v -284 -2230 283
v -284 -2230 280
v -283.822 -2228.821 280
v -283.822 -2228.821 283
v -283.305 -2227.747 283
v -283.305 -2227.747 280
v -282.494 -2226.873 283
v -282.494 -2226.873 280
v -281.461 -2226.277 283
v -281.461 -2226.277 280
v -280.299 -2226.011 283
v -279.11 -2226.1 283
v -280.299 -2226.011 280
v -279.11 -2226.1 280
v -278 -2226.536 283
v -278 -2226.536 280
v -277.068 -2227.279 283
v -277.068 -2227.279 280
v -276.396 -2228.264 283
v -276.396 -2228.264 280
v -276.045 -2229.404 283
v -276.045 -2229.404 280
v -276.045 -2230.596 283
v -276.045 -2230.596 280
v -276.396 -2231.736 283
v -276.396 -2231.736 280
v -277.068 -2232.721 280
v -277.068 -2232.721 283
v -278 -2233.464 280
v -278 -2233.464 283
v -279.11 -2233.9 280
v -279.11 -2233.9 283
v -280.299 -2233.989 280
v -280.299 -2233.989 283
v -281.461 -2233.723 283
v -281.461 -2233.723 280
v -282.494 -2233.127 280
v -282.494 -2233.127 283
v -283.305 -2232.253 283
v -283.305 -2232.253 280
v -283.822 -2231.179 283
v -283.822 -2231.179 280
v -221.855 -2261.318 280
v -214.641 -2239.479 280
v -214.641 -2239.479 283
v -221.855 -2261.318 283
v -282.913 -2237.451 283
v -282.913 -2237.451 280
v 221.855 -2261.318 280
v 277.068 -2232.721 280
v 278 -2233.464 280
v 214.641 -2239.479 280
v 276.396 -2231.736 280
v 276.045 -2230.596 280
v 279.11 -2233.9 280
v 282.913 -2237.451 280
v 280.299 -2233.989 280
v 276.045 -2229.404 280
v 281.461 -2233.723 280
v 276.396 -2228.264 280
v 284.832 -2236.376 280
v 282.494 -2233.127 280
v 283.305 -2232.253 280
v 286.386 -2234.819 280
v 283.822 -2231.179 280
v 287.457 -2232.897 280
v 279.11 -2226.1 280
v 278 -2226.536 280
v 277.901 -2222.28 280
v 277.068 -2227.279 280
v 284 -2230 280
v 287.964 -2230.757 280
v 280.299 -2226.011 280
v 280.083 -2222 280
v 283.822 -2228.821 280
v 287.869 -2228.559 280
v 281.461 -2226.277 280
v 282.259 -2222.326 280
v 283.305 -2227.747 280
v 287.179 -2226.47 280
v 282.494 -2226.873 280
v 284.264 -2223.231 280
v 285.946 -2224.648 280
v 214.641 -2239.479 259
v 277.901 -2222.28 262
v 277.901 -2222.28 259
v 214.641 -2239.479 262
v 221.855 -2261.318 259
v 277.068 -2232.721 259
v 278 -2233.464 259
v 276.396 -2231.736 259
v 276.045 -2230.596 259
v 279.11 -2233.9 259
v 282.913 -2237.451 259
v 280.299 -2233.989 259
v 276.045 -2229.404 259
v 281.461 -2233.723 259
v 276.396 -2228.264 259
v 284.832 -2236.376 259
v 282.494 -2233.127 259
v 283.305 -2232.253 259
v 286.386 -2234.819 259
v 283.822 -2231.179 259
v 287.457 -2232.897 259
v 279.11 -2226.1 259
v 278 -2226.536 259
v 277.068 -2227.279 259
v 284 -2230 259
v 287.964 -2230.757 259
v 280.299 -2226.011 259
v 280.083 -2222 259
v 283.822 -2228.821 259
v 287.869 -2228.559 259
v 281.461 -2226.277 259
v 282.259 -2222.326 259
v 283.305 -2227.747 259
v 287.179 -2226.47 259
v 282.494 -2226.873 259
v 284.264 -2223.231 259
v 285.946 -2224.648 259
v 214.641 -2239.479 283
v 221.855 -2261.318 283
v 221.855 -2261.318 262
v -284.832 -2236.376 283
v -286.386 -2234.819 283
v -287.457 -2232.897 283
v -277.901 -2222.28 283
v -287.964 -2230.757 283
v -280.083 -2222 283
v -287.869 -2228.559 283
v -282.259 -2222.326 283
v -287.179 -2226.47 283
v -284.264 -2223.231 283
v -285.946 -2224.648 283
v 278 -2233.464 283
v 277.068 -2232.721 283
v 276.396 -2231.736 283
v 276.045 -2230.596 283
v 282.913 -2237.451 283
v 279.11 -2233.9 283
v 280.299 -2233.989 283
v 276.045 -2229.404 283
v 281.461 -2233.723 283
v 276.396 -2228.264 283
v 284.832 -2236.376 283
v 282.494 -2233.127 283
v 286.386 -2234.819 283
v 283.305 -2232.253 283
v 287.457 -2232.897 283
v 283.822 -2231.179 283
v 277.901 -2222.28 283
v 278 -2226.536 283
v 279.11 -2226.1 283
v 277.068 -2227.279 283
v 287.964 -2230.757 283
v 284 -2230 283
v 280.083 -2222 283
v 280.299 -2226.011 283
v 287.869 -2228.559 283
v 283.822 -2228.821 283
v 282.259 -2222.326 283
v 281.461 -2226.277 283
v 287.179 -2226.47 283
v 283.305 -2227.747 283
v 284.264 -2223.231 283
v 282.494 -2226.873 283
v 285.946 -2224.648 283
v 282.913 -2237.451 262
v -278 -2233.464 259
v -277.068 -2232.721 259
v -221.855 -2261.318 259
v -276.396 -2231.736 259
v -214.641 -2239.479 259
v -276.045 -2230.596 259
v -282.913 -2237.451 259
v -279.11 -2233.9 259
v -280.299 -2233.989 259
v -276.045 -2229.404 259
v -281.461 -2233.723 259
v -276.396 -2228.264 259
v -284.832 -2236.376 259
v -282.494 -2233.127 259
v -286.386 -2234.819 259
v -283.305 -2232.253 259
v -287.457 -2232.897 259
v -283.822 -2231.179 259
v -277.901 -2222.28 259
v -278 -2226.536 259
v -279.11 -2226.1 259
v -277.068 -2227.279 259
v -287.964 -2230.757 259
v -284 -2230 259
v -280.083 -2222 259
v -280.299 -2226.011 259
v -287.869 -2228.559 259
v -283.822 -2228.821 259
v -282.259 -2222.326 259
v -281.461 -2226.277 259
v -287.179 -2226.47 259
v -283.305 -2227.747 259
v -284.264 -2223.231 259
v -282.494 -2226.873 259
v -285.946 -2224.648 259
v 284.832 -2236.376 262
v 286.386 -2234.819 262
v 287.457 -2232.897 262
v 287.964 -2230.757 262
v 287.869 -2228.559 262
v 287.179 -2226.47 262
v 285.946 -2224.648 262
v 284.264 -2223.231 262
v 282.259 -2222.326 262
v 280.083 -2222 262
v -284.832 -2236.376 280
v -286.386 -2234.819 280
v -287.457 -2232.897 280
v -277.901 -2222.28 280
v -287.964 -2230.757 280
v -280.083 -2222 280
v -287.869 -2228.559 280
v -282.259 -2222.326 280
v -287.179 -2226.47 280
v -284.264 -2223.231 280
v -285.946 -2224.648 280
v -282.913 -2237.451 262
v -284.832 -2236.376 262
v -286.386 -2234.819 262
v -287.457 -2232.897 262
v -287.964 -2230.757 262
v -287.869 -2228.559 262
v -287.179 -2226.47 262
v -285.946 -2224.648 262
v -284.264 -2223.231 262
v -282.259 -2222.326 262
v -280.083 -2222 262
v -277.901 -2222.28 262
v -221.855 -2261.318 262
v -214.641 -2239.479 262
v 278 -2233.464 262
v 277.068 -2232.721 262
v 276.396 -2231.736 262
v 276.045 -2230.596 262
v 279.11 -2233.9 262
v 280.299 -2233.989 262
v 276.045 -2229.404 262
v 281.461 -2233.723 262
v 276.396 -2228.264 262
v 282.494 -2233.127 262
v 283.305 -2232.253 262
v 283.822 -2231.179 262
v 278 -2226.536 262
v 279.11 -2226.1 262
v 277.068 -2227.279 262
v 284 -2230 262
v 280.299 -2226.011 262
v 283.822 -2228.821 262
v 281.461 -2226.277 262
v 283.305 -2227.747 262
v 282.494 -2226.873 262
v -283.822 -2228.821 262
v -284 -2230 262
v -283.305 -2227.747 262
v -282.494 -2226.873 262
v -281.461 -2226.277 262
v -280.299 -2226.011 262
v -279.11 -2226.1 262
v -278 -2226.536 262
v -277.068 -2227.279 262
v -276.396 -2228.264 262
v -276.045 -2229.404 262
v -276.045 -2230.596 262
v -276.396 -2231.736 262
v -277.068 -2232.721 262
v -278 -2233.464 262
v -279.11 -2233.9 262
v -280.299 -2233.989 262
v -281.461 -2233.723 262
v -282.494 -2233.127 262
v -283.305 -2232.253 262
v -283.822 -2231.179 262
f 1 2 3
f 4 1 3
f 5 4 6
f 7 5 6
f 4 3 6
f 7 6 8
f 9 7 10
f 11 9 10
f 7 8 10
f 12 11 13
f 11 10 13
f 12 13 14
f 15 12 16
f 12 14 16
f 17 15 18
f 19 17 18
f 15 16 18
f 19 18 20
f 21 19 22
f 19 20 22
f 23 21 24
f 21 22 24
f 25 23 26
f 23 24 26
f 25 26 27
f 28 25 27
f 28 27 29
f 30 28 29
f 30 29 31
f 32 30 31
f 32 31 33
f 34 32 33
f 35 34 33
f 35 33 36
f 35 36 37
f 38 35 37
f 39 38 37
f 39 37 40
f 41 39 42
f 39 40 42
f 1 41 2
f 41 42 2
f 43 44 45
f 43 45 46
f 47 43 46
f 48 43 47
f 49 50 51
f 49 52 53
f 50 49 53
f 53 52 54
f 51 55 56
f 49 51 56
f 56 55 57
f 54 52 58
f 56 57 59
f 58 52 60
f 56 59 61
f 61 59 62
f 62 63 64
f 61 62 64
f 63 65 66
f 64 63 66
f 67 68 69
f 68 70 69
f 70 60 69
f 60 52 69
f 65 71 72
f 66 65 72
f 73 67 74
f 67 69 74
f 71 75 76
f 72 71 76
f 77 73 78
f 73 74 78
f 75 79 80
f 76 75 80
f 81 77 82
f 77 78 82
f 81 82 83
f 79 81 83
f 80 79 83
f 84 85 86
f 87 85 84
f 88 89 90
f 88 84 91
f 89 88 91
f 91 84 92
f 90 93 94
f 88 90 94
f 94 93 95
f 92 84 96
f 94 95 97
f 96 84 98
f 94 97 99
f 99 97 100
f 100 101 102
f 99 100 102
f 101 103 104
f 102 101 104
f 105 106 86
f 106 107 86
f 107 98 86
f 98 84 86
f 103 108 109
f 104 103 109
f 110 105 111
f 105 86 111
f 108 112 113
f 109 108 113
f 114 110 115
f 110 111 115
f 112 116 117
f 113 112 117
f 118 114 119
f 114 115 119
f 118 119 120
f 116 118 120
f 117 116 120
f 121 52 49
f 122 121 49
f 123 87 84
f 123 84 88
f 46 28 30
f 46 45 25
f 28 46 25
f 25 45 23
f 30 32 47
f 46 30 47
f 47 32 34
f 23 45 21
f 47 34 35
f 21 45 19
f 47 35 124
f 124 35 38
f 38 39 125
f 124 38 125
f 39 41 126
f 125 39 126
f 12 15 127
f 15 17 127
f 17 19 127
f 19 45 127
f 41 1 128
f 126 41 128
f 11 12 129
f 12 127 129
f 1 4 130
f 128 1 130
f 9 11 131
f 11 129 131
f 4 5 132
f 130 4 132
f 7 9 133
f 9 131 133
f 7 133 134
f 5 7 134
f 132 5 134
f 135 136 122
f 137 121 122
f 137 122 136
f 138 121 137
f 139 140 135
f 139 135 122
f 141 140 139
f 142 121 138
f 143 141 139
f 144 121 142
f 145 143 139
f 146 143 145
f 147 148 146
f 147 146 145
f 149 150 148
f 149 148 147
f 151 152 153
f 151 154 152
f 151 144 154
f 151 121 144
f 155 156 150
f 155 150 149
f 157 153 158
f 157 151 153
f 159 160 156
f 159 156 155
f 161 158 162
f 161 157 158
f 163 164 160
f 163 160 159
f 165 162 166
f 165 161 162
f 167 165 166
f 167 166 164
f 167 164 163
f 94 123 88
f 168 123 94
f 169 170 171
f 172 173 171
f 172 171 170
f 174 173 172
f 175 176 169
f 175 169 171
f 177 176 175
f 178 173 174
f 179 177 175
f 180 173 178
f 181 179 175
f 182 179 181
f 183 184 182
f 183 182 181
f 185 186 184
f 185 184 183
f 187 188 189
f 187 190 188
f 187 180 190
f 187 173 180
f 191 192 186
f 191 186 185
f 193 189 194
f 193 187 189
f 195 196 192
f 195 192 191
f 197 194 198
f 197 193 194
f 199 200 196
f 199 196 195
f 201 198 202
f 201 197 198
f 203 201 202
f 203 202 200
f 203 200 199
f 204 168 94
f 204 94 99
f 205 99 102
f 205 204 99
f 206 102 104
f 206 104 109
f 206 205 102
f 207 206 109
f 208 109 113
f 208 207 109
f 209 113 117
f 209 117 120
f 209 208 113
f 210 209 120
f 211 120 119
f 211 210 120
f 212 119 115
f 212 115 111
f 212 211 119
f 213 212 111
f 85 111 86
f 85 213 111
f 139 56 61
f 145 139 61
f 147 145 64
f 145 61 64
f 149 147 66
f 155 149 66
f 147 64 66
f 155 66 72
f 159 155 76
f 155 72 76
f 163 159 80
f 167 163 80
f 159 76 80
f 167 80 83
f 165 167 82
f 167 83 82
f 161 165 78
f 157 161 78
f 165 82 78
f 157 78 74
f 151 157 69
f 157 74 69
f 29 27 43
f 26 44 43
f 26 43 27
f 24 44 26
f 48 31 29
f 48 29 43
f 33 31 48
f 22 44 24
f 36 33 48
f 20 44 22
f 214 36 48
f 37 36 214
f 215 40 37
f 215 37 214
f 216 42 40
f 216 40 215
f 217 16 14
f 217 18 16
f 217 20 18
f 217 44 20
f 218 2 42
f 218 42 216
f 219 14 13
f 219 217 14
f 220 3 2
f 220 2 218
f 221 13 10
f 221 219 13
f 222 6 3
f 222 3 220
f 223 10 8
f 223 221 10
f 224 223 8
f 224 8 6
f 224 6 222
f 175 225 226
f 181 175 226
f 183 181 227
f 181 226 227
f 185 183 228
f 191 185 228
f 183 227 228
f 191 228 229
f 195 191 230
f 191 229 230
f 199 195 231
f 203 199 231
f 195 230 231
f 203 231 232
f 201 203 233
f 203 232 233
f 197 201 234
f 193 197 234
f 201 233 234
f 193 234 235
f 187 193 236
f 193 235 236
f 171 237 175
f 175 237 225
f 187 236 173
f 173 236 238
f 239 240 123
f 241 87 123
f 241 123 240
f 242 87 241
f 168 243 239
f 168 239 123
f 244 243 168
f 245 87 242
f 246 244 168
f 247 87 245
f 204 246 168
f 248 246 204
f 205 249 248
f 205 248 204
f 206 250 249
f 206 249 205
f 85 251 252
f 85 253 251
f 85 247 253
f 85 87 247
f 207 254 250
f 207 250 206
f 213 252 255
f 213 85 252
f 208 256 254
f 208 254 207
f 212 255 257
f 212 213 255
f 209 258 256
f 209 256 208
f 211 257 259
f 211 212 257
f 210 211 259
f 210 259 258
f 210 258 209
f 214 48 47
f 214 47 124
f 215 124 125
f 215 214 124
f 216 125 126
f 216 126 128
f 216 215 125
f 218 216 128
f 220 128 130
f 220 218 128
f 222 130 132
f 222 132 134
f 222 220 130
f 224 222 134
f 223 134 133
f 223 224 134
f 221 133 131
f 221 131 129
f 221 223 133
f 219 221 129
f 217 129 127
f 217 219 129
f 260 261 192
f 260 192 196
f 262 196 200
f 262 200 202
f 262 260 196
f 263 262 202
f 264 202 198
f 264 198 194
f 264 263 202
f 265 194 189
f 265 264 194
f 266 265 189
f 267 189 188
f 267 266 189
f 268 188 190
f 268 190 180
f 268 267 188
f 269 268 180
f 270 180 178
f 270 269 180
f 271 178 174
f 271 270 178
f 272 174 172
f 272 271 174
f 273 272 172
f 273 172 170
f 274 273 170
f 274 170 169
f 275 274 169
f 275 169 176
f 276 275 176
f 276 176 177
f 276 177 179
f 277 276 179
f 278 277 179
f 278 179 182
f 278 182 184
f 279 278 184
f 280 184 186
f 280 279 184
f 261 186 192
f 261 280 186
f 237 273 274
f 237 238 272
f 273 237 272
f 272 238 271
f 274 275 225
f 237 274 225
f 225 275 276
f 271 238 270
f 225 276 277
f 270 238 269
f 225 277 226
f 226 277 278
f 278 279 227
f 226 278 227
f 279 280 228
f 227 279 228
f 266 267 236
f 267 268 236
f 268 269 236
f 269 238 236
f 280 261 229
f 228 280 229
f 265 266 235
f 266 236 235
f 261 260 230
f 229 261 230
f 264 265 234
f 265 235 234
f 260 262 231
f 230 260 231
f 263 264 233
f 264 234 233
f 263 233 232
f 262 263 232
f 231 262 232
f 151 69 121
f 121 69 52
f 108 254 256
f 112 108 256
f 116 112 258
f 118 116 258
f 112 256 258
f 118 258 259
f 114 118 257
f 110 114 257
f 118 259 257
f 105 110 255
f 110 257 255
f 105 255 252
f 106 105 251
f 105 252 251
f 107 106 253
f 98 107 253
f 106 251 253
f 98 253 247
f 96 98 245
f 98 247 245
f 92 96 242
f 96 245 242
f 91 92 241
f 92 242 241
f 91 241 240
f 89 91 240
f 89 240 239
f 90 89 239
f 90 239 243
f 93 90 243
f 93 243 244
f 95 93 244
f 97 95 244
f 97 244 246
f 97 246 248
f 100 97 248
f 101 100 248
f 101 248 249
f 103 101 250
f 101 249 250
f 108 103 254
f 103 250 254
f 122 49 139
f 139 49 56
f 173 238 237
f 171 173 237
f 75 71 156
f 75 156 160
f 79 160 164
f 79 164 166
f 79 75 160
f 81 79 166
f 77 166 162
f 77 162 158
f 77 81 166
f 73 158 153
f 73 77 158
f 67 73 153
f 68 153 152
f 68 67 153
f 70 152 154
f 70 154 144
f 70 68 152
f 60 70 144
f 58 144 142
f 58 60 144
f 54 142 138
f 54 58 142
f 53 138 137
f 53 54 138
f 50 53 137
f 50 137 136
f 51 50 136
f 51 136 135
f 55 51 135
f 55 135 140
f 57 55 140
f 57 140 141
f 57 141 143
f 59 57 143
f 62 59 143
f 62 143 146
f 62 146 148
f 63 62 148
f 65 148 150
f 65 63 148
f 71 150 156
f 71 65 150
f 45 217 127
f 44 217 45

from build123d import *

# Parameters (mm, degrees)
BOSS_EXTRUDE1_START     = 280
BOSS_EXTRUDE1_OUTLINE_R = 4
BOSS_EXTRUDE1_DEPTH     = 3


# Read off the part's stored shape, not the designer's step: Boss-Extrude1
with BuildPart() as part:
    # Boss-Extrude1 outline → Boss-Extrude1 (new body)
    with BuildSketch(Plane.XY.offset(BOSS_EXTRUDE1_START)):
        with BuildLine():
            Line((221.855223646, -2261.318170185), (282.912569681, -2237.450968921))
            ThreePointArc((282.912569681, -2237.450968921), (287.596282146, -2227.490717719), (277.901209765, -2222.280215058))
            Line((277.901209765, -2222.280215058), (214.64103709, -2239.478859016))
            Line((214.64103709, -2239.478859016), (221.855223646, -2261.318170185))
        make_face()
        with Locations((280, -2230)):
            Circle(BOSS_EXTRUDE1_OUTLINE_R, mode=Mode.SUBTRACT)
    extrude(amount=BOSS_EXTRUDE1_DEPTH)


with BuildPart() as body_2:
    # Mirror1: mirrored copy
    add(part.part.mirror(Plane(origin=(0, 0, 271), x_dir=(1, 0, 0), z_dir=(0, 0, -1))))


with BuildPart() as body_3:
    # Mirror2: mirrored copy
    add(part.part.mirror(Plane(origin=(0, 0, 0), x_dir=(0, 0, 1), z_dir=(1, 0, 0))))


with BuildPart() as body_4:
    # Mirror2 2: mirrored copy
    add(body_2.part.mirror(Plane(origin=(0, 0, 0), x_dir=(0, 0, 1), z_dir=(1, 0, 0))))


solid = Compound([part.part, body_2.part, body_3.part, body_4.part])
